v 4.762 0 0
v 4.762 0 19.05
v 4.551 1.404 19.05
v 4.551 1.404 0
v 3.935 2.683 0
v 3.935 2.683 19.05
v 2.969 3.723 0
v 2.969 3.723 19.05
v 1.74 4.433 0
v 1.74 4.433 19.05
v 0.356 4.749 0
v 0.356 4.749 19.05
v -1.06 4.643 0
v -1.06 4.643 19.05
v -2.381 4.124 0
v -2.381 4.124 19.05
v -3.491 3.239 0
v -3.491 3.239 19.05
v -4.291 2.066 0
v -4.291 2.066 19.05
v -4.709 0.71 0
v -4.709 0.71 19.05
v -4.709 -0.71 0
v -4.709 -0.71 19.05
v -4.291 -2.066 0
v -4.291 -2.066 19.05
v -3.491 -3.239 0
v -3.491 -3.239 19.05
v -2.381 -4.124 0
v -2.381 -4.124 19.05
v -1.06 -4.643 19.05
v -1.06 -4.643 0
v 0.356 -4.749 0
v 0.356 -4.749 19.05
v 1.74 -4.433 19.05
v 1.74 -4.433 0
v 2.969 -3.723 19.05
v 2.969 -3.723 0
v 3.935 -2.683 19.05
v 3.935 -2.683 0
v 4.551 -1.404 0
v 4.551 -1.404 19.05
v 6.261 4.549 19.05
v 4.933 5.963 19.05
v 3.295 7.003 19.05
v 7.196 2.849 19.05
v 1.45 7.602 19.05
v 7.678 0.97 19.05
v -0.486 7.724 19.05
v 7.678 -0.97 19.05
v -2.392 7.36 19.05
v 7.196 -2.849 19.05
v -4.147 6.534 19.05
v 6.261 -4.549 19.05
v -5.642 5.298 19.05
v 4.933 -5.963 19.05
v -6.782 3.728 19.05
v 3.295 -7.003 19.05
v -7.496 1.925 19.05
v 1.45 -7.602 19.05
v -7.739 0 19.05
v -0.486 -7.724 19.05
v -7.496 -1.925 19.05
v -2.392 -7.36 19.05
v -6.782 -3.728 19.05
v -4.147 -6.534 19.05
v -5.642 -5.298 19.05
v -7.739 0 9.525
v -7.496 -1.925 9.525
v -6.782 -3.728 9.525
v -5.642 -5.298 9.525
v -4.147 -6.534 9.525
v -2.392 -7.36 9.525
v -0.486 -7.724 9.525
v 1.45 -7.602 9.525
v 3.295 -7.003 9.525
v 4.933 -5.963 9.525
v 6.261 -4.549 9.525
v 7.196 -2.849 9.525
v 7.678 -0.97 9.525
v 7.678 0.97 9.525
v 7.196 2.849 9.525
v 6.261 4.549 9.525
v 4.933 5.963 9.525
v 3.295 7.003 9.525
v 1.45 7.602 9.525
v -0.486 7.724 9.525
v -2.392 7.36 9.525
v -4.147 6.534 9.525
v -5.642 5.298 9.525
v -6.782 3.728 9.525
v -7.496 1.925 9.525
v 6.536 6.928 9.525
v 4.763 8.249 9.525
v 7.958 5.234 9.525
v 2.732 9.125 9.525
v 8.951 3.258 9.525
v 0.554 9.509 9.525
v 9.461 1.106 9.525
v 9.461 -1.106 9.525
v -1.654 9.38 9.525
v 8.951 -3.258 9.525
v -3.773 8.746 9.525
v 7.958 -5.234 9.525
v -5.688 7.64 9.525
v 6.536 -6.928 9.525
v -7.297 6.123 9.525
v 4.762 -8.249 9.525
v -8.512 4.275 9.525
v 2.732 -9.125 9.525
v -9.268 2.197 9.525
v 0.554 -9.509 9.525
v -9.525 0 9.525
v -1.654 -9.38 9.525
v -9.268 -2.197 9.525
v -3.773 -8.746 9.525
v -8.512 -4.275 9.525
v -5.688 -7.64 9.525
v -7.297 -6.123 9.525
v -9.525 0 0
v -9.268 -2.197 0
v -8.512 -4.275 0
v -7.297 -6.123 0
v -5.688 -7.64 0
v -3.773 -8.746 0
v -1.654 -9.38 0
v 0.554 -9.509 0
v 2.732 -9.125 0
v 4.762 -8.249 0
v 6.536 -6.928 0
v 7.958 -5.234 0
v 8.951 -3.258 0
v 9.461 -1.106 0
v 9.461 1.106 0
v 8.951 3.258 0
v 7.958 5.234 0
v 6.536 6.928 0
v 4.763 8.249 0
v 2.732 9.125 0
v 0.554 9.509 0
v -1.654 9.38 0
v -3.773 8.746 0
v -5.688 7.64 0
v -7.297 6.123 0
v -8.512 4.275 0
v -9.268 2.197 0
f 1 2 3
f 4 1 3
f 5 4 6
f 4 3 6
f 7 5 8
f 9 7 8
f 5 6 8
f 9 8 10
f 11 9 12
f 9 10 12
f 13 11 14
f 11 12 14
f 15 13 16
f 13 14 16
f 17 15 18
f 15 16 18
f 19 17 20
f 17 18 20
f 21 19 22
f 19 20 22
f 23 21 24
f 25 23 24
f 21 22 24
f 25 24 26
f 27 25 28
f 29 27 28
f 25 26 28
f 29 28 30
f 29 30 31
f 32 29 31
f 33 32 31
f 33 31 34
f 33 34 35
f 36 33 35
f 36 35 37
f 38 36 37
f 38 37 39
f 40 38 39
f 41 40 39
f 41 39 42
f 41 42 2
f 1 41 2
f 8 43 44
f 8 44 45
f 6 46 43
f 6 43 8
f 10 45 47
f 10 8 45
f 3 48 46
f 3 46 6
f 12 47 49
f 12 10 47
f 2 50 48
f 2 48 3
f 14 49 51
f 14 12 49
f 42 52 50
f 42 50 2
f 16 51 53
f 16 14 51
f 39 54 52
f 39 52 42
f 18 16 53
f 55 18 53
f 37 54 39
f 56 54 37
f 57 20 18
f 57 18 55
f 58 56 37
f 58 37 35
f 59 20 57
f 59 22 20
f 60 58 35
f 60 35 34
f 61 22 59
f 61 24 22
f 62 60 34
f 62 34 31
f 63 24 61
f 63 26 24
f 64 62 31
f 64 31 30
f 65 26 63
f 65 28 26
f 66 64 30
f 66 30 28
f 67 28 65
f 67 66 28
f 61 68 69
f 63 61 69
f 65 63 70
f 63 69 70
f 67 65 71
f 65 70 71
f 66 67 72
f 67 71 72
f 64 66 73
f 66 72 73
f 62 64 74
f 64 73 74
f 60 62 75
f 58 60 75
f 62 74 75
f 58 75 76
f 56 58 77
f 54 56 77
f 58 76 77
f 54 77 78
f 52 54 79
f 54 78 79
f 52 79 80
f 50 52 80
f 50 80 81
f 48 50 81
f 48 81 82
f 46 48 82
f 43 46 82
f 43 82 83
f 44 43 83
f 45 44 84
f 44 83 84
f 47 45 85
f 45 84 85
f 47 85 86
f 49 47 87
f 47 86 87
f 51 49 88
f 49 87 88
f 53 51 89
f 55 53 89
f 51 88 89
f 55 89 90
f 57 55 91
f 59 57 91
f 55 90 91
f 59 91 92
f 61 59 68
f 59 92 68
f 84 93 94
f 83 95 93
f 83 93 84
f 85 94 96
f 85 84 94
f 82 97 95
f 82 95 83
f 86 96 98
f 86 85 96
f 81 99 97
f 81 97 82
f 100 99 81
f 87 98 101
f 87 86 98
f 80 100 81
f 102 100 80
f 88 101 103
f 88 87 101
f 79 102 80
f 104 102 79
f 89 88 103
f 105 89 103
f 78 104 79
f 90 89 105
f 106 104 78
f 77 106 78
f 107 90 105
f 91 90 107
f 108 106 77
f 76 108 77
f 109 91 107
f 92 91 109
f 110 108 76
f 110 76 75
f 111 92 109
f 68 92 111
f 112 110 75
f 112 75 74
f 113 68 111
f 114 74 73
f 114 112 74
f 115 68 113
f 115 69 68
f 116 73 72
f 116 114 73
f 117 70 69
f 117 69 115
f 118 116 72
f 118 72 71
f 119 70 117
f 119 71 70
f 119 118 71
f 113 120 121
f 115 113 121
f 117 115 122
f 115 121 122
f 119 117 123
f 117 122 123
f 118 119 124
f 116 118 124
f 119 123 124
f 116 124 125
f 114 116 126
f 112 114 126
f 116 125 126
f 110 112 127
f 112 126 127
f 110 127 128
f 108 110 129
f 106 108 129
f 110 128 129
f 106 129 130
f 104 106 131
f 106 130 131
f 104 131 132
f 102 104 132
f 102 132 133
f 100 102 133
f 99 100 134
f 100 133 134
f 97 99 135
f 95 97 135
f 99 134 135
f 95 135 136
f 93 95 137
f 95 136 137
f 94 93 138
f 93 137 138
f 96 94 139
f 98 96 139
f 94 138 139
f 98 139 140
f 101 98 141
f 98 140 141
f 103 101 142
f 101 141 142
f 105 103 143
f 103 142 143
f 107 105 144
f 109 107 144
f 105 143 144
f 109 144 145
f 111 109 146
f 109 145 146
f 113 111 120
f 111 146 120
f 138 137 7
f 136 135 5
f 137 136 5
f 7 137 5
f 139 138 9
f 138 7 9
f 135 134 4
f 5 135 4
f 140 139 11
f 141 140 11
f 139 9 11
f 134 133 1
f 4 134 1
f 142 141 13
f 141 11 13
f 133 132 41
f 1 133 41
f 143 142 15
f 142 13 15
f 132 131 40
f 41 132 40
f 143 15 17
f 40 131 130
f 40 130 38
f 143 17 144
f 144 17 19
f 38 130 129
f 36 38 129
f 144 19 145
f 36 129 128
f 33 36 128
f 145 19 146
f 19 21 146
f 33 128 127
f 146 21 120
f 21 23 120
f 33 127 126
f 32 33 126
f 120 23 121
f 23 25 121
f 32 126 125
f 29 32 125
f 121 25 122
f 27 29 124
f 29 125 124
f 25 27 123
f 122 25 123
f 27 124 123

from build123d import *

# Parameters (mm, degrees)
SKETCH1_R           = 9.525
BOSS_EXTRUDE1_DEPTH = 9.525
SKETCH2_R           = 7.7390625
BOSS_EXTRUDE2_DEPTH = 9.525
SKETCH3_R           = 4.7625
CUT_EXTRUDE1_DEPTH  = 24.3313898


with BuildPart() as part:
    # Sketch1 → Boss-Extrude1 (new body)
    with BuildSketch(Plane.XY):
        with Locations(Location((0, 0, 0), (0, 0, 180))):
            Circle(SKETCH1_R)
    extrude(amount=BOSS_EXTRUDE1_DEPTH)

    # Sketch2 → Boss-Extrude2 (add)
    with BuildSketch(Plane.XY.offset(9.525)):
        with Locations(Location((0, 0, 0), (0, 0, 180))):
            Circle(SKETCH2_R)
    extrude(amount=BOSS_EXTRUDE2_DEPTH)

    # Sketch3 → Cut-Extrude1 (cut, through all)
    with BuildSketch(Plane.XY.offset(19.05)):
        Circle(SKETCH3_R)
    extrude(amount=-CUT_EXTRUDE1_DEPTH, mode=Mode.SUBTRACT)


solid = part.part
